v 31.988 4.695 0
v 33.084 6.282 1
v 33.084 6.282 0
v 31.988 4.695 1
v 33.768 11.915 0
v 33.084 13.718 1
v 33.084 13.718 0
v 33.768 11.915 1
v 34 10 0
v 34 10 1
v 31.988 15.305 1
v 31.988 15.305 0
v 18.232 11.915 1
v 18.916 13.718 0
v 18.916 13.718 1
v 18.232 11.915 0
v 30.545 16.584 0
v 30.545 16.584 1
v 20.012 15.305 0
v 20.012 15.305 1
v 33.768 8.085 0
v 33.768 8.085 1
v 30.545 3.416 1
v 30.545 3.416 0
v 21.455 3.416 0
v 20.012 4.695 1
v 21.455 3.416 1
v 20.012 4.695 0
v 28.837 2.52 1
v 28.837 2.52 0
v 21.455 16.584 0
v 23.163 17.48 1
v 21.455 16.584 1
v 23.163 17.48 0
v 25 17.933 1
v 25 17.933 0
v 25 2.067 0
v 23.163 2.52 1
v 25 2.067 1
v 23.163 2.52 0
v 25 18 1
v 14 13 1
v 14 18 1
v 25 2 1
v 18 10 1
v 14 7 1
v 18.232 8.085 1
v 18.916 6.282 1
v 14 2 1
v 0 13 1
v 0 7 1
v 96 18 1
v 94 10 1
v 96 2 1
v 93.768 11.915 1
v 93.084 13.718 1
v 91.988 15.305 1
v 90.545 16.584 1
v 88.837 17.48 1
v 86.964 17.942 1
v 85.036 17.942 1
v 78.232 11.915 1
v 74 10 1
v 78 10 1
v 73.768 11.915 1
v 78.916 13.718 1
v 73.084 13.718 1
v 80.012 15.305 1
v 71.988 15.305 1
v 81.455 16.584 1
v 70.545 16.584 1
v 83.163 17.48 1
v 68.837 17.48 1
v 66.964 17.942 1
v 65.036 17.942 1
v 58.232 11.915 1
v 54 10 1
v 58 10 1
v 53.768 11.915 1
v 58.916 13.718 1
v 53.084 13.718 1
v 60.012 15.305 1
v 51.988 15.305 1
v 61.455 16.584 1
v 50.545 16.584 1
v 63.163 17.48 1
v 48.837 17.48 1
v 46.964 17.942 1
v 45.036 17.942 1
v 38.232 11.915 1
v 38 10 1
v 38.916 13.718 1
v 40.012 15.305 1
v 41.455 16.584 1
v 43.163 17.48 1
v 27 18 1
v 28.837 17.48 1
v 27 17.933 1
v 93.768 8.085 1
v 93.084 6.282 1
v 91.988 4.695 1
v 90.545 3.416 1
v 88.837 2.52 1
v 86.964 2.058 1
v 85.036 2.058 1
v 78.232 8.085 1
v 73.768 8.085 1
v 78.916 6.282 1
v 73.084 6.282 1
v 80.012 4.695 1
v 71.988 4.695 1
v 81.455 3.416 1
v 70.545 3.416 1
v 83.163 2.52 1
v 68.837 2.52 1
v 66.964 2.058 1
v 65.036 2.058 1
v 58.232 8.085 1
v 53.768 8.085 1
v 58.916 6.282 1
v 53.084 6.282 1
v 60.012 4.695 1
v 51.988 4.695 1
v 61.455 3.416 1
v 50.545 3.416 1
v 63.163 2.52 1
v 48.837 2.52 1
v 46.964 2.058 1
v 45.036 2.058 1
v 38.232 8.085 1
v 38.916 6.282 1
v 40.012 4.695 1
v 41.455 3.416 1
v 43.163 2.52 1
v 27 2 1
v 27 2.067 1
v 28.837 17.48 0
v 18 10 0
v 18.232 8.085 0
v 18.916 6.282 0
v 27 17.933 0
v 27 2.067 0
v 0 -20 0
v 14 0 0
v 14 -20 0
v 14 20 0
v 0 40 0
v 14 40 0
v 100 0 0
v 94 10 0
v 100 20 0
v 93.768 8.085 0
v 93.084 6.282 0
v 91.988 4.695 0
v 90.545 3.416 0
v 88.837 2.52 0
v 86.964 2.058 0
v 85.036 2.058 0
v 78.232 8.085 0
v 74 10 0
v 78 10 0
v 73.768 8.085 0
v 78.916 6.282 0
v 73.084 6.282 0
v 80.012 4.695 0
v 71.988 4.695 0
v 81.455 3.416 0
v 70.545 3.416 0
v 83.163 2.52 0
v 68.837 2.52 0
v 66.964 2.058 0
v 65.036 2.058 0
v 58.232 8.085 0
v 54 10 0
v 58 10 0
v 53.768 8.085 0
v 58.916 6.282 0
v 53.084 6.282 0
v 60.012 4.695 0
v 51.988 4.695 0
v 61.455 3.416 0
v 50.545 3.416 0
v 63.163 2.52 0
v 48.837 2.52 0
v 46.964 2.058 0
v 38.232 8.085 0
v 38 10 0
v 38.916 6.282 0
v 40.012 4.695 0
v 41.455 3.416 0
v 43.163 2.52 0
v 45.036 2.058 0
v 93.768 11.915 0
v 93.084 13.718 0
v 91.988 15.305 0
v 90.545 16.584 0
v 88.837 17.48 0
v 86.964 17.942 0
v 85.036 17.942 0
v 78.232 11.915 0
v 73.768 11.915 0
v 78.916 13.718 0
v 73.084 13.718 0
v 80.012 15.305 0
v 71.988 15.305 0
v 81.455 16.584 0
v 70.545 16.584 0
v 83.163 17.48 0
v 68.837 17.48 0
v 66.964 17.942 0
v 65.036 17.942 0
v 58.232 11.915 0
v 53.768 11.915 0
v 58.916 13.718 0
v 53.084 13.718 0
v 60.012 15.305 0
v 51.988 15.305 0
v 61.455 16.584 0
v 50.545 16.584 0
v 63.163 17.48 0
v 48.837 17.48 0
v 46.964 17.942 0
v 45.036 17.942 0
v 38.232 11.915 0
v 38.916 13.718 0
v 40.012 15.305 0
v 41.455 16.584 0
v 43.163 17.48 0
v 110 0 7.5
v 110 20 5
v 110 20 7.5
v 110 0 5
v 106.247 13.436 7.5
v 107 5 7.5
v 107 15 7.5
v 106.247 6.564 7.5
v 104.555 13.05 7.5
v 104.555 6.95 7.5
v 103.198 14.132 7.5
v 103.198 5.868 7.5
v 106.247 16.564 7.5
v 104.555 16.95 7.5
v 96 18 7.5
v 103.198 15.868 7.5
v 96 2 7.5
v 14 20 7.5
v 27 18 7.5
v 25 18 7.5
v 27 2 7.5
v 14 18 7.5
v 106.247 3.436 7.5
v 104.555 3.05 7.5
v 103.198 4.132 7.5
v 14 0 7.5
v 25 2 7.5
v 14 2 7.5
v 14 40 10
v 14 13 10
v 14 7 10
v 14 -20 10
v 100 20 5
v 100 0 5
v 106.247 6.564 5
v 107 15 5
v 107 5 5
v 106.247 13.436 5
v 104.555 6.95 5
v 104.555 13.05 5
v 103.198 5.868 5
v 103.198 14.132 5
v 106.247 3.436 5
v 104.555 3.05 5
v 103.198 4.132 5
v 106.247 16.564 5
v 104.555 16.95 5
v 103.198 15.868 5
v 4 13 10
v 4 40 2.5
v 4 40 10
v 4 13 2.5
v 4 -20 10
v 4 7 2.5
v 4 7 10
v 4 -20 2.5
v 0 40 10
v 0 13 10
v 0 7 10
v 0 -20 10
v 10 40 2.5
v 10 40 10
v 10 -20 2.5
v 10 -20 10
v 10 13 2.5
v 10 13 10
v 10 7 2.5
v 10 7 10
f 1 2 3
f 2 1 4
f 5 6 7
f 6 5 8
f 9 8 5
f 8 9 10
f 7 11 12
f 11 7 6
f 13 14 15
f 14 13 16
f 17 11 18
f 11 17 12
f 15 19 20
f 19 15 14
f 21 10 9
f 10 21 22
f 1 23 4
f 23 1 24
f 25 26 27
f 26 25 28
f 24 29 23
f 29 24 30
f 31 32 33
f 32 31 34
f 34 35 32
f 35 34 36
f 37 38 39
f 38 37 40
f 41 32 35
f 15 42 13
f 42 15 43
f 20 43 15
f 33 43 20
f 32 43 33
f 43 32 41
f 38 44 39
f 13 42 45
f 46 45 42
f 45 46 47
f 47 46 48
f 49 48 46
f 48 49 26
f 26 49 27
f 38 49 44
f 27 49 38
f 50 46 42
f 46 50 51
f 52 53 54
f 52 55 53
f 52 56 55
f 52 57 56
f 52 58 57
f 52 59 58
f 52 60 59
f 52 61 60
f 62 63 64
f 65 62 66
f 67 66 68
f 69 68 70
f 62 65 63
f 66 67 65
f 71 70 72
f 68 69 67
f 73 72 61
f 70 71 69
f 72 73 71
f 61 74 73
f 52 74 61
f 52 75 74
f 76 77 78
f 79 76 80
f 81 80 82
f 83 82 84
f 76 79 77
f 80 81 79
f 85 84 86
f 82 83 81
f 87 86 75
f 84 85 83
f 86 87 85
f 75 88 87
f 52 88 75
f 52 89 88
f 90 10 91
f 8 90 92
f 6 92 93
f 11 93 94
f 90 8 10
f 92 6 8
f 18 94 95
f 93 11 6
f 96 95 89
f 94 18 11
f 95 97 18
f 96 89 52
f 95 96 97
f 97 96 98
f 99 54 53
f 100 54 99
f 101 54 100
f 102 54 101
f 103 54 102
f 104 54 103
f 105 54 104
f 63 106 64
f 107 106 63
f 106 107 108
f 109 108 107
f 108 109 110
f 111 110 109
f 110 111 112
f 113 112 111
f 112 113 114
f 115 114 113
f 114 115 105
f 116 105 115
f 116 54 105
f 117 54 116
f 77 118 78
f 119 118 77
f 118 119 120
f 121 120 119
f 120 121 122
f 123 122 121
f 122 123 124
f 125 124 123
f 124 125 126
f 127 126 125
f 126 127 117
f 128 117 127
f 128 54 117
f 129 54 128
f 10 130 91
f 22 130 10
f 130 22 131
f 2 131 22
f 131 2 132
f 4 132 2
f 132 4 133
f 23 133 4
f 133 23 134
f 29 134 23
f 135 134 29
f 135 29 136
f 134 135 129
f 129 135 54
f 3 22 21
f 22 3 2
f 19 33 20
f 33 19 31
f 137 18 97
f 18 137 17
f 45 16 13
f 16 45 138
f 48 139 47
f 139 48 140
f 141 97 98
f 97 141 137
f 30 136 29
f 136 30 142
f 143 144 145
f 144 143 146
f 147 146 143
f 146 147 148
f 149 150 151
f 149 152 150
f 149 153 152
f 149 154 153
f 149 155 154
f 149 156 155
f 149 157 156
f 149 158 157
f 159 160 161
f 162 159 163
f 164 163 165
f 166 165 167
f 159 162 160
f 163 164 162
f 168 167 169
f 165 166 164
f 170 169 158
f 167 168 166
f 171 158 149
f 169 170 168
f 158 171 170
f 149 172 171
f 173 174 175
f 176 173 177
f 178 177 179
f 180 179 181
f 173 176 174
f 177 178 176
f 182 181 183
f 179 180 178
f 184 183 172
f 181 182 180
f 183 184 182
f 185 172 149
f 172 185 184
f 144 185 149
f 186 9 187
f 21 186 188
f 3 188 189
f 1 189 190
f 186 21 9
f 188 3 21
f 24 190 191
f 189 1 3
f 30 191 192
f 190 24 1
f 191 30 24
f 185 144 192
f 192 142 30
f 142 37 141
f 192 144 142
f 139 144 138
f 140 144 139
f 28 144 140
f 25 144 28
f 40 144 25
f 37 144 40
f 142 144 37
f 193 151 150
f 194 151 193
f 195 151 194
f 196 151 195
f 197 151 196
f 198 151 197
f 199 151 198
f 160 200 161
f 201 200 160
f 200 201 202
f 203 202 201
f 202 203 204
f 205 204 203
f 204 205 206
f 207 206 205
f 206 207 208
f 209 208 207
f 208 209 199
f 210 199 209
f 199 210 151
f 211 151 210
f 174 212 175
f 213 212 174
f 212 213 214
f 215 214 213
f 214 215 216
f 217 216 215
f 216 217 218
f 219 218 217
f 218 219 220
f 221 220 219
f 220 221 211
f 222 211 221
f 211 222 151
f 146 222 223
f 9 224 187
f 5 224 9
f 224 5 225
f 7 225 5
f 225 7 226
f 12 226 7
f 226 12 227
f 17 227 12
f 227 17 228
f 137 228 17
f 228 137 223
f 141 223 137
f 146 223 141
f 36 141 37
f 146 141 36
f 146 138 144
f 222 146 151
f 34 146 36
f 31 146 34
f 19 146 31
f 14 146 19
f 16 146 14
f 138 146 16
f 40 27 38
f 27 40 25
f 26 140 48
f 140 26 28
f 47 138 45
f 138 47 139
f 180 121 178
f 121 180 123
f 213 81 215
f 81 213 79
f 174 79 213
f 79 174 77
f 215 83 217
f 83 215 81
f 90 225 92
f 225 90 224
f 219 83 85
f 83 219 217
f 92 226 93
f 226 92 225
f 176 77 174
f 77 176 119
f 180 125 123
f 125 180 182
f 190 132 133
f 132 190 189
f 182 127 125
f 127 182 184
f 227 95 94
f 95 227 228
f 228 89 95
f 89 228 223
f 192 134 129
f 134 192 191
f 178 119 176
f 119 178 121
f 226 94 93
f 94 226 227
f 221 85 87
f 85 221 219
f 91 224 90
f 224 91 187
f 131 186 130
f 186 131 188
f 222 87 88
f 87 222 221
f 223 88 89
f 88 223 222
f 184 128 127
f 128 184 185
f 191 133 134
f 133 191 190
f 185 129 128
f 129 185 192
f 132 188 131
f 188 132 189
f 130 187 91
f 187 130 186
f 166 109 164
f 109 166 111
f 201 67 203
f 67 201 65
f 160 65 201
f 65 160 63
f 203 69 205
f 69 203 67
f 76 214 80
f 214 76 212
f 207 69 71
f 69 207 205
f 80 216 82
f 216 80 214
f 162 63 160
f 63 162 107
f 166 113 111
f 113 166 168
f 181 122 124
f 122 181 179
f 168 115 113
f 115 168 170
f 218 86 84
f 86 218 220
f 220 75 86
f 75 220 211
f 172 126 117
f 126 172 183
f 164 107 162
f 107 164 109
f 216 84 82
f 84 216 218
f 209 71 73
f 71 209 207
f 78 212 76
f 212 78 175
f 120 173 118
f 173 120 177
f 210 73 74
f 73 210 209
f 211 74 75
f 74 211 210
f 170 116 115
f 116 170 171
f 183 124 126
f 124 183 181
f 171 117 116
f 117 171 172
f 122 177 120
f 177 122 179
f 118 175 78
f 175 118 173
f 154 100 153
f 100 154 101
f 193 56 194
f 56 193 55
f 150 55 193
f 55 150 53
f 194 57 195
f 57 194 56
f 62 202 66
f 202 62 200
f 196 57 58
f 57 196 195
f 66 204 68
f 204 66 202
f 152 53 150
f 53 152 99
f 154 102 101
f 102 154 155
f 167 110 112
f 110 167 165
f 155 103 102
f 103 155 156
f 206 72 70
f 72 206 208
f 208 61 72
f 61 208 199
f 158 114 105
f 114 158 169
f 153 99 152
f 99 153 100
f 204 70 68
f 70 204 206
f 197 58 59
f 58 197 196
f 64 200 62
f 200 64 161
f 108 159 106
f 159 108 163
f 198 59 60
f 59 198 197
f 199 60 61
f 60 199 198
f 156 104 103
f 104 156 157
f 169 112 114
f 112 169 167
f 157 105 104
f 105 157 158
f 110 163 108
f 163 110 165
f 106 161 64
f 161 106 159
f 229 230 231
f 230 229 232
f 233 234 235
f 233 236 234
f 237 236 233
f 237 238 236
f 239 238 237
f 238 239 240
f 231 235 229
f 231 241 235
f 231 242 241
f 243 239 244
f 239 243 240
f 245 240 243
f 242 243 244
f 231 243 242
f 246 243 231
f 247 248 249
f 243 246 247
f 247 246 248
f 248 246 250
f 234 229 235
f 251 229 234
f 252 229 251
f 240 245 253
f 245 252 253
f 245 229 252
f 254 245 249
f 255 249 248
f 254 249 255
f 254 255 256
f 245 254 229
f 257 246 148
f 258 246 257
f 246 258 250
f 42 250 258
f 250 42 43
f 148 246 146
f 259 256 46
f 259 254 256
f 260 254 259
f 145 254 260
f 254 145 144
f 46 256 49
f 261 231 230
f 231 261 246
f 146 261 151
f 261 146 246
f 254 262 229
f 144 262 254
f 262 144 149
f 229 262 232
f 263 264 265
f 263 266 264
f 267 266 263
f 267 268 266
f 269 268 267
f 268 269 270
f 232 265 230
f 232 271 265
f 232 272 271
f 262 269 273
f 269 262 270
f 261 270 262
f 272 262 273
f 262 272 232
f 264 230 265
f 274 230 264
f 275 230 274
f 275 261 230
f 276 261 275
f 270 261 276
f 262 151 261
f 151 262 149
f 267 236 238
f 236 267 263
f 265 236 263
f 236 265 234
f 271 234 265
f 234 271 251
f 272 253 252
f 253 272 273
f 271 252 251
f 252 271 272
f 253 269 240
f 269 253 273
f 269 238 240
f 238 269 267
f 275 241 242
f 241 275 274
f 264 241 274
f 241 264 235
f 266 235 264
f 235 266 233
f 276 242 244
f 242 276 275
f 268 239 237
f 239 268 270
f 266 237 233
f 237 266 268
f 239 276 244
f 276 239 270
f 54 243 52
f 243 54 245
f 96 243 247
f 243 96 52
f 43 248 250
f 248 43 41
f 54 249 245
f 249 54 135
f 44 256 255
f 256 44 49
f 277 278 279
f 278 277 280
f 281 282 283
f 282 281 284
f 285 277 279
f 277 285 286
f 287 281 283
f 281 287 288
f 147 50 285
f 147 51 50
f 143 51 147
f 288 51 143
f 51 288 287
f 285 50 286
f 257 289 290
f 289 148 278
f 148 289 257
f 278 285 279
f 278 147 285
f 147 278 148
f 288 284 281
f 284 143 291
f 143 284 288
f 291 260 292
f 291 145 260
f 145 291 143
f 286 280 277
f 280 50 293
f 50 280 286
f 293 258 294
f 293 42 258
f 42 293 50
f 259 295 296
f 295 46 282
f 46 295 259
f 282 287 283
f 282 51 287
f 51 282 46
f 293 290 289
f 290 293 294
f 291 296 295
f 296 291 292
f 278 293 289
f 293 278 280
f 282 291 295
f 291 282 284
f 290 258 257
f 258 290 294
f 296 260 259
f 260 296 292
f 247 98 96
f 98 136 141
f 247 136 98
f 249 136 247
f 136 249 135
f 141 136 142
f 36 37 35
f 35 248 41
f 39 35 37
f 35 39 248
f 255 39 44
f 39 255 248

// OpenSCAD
difference(){
  translate([14,0,0]){
    cube([96,20,7.5]);
  }
  translate([100,0,0]){
  cube([10,20,5]);
  }
  translate([105,5,5]){
    cylinder(r= 2, h = 10);
  }
  translate([105,15,5]){
    cylinder(r= 2, h = 10);
  }
  translate([14,2,1]){
    cube([82,16,10]);
  }
  for( i = [0 : 4] ){
  translate([i * 20 + 6,10,0]){
    cylinder(r= 8, h = 1);
  }
  }
}
difference(){
translate([0,-20,0]){
cube([4,60,10]);
}
translate([0,7,1]){
cube([14,6,10]);
}
}
difference(){
translate([4,-20,0]){
cube([6,60,2.5]);
}
translate([0,7,1]){
cube([14,6,10]);
}
}
difference(){
translate([10,-20,0]){
cube([4,60,10]);
}
translate([0,7,1]){
cube([14,6,10]);
}
}
translate([25,0,0]){
cube([2,20,7.5]);
}
